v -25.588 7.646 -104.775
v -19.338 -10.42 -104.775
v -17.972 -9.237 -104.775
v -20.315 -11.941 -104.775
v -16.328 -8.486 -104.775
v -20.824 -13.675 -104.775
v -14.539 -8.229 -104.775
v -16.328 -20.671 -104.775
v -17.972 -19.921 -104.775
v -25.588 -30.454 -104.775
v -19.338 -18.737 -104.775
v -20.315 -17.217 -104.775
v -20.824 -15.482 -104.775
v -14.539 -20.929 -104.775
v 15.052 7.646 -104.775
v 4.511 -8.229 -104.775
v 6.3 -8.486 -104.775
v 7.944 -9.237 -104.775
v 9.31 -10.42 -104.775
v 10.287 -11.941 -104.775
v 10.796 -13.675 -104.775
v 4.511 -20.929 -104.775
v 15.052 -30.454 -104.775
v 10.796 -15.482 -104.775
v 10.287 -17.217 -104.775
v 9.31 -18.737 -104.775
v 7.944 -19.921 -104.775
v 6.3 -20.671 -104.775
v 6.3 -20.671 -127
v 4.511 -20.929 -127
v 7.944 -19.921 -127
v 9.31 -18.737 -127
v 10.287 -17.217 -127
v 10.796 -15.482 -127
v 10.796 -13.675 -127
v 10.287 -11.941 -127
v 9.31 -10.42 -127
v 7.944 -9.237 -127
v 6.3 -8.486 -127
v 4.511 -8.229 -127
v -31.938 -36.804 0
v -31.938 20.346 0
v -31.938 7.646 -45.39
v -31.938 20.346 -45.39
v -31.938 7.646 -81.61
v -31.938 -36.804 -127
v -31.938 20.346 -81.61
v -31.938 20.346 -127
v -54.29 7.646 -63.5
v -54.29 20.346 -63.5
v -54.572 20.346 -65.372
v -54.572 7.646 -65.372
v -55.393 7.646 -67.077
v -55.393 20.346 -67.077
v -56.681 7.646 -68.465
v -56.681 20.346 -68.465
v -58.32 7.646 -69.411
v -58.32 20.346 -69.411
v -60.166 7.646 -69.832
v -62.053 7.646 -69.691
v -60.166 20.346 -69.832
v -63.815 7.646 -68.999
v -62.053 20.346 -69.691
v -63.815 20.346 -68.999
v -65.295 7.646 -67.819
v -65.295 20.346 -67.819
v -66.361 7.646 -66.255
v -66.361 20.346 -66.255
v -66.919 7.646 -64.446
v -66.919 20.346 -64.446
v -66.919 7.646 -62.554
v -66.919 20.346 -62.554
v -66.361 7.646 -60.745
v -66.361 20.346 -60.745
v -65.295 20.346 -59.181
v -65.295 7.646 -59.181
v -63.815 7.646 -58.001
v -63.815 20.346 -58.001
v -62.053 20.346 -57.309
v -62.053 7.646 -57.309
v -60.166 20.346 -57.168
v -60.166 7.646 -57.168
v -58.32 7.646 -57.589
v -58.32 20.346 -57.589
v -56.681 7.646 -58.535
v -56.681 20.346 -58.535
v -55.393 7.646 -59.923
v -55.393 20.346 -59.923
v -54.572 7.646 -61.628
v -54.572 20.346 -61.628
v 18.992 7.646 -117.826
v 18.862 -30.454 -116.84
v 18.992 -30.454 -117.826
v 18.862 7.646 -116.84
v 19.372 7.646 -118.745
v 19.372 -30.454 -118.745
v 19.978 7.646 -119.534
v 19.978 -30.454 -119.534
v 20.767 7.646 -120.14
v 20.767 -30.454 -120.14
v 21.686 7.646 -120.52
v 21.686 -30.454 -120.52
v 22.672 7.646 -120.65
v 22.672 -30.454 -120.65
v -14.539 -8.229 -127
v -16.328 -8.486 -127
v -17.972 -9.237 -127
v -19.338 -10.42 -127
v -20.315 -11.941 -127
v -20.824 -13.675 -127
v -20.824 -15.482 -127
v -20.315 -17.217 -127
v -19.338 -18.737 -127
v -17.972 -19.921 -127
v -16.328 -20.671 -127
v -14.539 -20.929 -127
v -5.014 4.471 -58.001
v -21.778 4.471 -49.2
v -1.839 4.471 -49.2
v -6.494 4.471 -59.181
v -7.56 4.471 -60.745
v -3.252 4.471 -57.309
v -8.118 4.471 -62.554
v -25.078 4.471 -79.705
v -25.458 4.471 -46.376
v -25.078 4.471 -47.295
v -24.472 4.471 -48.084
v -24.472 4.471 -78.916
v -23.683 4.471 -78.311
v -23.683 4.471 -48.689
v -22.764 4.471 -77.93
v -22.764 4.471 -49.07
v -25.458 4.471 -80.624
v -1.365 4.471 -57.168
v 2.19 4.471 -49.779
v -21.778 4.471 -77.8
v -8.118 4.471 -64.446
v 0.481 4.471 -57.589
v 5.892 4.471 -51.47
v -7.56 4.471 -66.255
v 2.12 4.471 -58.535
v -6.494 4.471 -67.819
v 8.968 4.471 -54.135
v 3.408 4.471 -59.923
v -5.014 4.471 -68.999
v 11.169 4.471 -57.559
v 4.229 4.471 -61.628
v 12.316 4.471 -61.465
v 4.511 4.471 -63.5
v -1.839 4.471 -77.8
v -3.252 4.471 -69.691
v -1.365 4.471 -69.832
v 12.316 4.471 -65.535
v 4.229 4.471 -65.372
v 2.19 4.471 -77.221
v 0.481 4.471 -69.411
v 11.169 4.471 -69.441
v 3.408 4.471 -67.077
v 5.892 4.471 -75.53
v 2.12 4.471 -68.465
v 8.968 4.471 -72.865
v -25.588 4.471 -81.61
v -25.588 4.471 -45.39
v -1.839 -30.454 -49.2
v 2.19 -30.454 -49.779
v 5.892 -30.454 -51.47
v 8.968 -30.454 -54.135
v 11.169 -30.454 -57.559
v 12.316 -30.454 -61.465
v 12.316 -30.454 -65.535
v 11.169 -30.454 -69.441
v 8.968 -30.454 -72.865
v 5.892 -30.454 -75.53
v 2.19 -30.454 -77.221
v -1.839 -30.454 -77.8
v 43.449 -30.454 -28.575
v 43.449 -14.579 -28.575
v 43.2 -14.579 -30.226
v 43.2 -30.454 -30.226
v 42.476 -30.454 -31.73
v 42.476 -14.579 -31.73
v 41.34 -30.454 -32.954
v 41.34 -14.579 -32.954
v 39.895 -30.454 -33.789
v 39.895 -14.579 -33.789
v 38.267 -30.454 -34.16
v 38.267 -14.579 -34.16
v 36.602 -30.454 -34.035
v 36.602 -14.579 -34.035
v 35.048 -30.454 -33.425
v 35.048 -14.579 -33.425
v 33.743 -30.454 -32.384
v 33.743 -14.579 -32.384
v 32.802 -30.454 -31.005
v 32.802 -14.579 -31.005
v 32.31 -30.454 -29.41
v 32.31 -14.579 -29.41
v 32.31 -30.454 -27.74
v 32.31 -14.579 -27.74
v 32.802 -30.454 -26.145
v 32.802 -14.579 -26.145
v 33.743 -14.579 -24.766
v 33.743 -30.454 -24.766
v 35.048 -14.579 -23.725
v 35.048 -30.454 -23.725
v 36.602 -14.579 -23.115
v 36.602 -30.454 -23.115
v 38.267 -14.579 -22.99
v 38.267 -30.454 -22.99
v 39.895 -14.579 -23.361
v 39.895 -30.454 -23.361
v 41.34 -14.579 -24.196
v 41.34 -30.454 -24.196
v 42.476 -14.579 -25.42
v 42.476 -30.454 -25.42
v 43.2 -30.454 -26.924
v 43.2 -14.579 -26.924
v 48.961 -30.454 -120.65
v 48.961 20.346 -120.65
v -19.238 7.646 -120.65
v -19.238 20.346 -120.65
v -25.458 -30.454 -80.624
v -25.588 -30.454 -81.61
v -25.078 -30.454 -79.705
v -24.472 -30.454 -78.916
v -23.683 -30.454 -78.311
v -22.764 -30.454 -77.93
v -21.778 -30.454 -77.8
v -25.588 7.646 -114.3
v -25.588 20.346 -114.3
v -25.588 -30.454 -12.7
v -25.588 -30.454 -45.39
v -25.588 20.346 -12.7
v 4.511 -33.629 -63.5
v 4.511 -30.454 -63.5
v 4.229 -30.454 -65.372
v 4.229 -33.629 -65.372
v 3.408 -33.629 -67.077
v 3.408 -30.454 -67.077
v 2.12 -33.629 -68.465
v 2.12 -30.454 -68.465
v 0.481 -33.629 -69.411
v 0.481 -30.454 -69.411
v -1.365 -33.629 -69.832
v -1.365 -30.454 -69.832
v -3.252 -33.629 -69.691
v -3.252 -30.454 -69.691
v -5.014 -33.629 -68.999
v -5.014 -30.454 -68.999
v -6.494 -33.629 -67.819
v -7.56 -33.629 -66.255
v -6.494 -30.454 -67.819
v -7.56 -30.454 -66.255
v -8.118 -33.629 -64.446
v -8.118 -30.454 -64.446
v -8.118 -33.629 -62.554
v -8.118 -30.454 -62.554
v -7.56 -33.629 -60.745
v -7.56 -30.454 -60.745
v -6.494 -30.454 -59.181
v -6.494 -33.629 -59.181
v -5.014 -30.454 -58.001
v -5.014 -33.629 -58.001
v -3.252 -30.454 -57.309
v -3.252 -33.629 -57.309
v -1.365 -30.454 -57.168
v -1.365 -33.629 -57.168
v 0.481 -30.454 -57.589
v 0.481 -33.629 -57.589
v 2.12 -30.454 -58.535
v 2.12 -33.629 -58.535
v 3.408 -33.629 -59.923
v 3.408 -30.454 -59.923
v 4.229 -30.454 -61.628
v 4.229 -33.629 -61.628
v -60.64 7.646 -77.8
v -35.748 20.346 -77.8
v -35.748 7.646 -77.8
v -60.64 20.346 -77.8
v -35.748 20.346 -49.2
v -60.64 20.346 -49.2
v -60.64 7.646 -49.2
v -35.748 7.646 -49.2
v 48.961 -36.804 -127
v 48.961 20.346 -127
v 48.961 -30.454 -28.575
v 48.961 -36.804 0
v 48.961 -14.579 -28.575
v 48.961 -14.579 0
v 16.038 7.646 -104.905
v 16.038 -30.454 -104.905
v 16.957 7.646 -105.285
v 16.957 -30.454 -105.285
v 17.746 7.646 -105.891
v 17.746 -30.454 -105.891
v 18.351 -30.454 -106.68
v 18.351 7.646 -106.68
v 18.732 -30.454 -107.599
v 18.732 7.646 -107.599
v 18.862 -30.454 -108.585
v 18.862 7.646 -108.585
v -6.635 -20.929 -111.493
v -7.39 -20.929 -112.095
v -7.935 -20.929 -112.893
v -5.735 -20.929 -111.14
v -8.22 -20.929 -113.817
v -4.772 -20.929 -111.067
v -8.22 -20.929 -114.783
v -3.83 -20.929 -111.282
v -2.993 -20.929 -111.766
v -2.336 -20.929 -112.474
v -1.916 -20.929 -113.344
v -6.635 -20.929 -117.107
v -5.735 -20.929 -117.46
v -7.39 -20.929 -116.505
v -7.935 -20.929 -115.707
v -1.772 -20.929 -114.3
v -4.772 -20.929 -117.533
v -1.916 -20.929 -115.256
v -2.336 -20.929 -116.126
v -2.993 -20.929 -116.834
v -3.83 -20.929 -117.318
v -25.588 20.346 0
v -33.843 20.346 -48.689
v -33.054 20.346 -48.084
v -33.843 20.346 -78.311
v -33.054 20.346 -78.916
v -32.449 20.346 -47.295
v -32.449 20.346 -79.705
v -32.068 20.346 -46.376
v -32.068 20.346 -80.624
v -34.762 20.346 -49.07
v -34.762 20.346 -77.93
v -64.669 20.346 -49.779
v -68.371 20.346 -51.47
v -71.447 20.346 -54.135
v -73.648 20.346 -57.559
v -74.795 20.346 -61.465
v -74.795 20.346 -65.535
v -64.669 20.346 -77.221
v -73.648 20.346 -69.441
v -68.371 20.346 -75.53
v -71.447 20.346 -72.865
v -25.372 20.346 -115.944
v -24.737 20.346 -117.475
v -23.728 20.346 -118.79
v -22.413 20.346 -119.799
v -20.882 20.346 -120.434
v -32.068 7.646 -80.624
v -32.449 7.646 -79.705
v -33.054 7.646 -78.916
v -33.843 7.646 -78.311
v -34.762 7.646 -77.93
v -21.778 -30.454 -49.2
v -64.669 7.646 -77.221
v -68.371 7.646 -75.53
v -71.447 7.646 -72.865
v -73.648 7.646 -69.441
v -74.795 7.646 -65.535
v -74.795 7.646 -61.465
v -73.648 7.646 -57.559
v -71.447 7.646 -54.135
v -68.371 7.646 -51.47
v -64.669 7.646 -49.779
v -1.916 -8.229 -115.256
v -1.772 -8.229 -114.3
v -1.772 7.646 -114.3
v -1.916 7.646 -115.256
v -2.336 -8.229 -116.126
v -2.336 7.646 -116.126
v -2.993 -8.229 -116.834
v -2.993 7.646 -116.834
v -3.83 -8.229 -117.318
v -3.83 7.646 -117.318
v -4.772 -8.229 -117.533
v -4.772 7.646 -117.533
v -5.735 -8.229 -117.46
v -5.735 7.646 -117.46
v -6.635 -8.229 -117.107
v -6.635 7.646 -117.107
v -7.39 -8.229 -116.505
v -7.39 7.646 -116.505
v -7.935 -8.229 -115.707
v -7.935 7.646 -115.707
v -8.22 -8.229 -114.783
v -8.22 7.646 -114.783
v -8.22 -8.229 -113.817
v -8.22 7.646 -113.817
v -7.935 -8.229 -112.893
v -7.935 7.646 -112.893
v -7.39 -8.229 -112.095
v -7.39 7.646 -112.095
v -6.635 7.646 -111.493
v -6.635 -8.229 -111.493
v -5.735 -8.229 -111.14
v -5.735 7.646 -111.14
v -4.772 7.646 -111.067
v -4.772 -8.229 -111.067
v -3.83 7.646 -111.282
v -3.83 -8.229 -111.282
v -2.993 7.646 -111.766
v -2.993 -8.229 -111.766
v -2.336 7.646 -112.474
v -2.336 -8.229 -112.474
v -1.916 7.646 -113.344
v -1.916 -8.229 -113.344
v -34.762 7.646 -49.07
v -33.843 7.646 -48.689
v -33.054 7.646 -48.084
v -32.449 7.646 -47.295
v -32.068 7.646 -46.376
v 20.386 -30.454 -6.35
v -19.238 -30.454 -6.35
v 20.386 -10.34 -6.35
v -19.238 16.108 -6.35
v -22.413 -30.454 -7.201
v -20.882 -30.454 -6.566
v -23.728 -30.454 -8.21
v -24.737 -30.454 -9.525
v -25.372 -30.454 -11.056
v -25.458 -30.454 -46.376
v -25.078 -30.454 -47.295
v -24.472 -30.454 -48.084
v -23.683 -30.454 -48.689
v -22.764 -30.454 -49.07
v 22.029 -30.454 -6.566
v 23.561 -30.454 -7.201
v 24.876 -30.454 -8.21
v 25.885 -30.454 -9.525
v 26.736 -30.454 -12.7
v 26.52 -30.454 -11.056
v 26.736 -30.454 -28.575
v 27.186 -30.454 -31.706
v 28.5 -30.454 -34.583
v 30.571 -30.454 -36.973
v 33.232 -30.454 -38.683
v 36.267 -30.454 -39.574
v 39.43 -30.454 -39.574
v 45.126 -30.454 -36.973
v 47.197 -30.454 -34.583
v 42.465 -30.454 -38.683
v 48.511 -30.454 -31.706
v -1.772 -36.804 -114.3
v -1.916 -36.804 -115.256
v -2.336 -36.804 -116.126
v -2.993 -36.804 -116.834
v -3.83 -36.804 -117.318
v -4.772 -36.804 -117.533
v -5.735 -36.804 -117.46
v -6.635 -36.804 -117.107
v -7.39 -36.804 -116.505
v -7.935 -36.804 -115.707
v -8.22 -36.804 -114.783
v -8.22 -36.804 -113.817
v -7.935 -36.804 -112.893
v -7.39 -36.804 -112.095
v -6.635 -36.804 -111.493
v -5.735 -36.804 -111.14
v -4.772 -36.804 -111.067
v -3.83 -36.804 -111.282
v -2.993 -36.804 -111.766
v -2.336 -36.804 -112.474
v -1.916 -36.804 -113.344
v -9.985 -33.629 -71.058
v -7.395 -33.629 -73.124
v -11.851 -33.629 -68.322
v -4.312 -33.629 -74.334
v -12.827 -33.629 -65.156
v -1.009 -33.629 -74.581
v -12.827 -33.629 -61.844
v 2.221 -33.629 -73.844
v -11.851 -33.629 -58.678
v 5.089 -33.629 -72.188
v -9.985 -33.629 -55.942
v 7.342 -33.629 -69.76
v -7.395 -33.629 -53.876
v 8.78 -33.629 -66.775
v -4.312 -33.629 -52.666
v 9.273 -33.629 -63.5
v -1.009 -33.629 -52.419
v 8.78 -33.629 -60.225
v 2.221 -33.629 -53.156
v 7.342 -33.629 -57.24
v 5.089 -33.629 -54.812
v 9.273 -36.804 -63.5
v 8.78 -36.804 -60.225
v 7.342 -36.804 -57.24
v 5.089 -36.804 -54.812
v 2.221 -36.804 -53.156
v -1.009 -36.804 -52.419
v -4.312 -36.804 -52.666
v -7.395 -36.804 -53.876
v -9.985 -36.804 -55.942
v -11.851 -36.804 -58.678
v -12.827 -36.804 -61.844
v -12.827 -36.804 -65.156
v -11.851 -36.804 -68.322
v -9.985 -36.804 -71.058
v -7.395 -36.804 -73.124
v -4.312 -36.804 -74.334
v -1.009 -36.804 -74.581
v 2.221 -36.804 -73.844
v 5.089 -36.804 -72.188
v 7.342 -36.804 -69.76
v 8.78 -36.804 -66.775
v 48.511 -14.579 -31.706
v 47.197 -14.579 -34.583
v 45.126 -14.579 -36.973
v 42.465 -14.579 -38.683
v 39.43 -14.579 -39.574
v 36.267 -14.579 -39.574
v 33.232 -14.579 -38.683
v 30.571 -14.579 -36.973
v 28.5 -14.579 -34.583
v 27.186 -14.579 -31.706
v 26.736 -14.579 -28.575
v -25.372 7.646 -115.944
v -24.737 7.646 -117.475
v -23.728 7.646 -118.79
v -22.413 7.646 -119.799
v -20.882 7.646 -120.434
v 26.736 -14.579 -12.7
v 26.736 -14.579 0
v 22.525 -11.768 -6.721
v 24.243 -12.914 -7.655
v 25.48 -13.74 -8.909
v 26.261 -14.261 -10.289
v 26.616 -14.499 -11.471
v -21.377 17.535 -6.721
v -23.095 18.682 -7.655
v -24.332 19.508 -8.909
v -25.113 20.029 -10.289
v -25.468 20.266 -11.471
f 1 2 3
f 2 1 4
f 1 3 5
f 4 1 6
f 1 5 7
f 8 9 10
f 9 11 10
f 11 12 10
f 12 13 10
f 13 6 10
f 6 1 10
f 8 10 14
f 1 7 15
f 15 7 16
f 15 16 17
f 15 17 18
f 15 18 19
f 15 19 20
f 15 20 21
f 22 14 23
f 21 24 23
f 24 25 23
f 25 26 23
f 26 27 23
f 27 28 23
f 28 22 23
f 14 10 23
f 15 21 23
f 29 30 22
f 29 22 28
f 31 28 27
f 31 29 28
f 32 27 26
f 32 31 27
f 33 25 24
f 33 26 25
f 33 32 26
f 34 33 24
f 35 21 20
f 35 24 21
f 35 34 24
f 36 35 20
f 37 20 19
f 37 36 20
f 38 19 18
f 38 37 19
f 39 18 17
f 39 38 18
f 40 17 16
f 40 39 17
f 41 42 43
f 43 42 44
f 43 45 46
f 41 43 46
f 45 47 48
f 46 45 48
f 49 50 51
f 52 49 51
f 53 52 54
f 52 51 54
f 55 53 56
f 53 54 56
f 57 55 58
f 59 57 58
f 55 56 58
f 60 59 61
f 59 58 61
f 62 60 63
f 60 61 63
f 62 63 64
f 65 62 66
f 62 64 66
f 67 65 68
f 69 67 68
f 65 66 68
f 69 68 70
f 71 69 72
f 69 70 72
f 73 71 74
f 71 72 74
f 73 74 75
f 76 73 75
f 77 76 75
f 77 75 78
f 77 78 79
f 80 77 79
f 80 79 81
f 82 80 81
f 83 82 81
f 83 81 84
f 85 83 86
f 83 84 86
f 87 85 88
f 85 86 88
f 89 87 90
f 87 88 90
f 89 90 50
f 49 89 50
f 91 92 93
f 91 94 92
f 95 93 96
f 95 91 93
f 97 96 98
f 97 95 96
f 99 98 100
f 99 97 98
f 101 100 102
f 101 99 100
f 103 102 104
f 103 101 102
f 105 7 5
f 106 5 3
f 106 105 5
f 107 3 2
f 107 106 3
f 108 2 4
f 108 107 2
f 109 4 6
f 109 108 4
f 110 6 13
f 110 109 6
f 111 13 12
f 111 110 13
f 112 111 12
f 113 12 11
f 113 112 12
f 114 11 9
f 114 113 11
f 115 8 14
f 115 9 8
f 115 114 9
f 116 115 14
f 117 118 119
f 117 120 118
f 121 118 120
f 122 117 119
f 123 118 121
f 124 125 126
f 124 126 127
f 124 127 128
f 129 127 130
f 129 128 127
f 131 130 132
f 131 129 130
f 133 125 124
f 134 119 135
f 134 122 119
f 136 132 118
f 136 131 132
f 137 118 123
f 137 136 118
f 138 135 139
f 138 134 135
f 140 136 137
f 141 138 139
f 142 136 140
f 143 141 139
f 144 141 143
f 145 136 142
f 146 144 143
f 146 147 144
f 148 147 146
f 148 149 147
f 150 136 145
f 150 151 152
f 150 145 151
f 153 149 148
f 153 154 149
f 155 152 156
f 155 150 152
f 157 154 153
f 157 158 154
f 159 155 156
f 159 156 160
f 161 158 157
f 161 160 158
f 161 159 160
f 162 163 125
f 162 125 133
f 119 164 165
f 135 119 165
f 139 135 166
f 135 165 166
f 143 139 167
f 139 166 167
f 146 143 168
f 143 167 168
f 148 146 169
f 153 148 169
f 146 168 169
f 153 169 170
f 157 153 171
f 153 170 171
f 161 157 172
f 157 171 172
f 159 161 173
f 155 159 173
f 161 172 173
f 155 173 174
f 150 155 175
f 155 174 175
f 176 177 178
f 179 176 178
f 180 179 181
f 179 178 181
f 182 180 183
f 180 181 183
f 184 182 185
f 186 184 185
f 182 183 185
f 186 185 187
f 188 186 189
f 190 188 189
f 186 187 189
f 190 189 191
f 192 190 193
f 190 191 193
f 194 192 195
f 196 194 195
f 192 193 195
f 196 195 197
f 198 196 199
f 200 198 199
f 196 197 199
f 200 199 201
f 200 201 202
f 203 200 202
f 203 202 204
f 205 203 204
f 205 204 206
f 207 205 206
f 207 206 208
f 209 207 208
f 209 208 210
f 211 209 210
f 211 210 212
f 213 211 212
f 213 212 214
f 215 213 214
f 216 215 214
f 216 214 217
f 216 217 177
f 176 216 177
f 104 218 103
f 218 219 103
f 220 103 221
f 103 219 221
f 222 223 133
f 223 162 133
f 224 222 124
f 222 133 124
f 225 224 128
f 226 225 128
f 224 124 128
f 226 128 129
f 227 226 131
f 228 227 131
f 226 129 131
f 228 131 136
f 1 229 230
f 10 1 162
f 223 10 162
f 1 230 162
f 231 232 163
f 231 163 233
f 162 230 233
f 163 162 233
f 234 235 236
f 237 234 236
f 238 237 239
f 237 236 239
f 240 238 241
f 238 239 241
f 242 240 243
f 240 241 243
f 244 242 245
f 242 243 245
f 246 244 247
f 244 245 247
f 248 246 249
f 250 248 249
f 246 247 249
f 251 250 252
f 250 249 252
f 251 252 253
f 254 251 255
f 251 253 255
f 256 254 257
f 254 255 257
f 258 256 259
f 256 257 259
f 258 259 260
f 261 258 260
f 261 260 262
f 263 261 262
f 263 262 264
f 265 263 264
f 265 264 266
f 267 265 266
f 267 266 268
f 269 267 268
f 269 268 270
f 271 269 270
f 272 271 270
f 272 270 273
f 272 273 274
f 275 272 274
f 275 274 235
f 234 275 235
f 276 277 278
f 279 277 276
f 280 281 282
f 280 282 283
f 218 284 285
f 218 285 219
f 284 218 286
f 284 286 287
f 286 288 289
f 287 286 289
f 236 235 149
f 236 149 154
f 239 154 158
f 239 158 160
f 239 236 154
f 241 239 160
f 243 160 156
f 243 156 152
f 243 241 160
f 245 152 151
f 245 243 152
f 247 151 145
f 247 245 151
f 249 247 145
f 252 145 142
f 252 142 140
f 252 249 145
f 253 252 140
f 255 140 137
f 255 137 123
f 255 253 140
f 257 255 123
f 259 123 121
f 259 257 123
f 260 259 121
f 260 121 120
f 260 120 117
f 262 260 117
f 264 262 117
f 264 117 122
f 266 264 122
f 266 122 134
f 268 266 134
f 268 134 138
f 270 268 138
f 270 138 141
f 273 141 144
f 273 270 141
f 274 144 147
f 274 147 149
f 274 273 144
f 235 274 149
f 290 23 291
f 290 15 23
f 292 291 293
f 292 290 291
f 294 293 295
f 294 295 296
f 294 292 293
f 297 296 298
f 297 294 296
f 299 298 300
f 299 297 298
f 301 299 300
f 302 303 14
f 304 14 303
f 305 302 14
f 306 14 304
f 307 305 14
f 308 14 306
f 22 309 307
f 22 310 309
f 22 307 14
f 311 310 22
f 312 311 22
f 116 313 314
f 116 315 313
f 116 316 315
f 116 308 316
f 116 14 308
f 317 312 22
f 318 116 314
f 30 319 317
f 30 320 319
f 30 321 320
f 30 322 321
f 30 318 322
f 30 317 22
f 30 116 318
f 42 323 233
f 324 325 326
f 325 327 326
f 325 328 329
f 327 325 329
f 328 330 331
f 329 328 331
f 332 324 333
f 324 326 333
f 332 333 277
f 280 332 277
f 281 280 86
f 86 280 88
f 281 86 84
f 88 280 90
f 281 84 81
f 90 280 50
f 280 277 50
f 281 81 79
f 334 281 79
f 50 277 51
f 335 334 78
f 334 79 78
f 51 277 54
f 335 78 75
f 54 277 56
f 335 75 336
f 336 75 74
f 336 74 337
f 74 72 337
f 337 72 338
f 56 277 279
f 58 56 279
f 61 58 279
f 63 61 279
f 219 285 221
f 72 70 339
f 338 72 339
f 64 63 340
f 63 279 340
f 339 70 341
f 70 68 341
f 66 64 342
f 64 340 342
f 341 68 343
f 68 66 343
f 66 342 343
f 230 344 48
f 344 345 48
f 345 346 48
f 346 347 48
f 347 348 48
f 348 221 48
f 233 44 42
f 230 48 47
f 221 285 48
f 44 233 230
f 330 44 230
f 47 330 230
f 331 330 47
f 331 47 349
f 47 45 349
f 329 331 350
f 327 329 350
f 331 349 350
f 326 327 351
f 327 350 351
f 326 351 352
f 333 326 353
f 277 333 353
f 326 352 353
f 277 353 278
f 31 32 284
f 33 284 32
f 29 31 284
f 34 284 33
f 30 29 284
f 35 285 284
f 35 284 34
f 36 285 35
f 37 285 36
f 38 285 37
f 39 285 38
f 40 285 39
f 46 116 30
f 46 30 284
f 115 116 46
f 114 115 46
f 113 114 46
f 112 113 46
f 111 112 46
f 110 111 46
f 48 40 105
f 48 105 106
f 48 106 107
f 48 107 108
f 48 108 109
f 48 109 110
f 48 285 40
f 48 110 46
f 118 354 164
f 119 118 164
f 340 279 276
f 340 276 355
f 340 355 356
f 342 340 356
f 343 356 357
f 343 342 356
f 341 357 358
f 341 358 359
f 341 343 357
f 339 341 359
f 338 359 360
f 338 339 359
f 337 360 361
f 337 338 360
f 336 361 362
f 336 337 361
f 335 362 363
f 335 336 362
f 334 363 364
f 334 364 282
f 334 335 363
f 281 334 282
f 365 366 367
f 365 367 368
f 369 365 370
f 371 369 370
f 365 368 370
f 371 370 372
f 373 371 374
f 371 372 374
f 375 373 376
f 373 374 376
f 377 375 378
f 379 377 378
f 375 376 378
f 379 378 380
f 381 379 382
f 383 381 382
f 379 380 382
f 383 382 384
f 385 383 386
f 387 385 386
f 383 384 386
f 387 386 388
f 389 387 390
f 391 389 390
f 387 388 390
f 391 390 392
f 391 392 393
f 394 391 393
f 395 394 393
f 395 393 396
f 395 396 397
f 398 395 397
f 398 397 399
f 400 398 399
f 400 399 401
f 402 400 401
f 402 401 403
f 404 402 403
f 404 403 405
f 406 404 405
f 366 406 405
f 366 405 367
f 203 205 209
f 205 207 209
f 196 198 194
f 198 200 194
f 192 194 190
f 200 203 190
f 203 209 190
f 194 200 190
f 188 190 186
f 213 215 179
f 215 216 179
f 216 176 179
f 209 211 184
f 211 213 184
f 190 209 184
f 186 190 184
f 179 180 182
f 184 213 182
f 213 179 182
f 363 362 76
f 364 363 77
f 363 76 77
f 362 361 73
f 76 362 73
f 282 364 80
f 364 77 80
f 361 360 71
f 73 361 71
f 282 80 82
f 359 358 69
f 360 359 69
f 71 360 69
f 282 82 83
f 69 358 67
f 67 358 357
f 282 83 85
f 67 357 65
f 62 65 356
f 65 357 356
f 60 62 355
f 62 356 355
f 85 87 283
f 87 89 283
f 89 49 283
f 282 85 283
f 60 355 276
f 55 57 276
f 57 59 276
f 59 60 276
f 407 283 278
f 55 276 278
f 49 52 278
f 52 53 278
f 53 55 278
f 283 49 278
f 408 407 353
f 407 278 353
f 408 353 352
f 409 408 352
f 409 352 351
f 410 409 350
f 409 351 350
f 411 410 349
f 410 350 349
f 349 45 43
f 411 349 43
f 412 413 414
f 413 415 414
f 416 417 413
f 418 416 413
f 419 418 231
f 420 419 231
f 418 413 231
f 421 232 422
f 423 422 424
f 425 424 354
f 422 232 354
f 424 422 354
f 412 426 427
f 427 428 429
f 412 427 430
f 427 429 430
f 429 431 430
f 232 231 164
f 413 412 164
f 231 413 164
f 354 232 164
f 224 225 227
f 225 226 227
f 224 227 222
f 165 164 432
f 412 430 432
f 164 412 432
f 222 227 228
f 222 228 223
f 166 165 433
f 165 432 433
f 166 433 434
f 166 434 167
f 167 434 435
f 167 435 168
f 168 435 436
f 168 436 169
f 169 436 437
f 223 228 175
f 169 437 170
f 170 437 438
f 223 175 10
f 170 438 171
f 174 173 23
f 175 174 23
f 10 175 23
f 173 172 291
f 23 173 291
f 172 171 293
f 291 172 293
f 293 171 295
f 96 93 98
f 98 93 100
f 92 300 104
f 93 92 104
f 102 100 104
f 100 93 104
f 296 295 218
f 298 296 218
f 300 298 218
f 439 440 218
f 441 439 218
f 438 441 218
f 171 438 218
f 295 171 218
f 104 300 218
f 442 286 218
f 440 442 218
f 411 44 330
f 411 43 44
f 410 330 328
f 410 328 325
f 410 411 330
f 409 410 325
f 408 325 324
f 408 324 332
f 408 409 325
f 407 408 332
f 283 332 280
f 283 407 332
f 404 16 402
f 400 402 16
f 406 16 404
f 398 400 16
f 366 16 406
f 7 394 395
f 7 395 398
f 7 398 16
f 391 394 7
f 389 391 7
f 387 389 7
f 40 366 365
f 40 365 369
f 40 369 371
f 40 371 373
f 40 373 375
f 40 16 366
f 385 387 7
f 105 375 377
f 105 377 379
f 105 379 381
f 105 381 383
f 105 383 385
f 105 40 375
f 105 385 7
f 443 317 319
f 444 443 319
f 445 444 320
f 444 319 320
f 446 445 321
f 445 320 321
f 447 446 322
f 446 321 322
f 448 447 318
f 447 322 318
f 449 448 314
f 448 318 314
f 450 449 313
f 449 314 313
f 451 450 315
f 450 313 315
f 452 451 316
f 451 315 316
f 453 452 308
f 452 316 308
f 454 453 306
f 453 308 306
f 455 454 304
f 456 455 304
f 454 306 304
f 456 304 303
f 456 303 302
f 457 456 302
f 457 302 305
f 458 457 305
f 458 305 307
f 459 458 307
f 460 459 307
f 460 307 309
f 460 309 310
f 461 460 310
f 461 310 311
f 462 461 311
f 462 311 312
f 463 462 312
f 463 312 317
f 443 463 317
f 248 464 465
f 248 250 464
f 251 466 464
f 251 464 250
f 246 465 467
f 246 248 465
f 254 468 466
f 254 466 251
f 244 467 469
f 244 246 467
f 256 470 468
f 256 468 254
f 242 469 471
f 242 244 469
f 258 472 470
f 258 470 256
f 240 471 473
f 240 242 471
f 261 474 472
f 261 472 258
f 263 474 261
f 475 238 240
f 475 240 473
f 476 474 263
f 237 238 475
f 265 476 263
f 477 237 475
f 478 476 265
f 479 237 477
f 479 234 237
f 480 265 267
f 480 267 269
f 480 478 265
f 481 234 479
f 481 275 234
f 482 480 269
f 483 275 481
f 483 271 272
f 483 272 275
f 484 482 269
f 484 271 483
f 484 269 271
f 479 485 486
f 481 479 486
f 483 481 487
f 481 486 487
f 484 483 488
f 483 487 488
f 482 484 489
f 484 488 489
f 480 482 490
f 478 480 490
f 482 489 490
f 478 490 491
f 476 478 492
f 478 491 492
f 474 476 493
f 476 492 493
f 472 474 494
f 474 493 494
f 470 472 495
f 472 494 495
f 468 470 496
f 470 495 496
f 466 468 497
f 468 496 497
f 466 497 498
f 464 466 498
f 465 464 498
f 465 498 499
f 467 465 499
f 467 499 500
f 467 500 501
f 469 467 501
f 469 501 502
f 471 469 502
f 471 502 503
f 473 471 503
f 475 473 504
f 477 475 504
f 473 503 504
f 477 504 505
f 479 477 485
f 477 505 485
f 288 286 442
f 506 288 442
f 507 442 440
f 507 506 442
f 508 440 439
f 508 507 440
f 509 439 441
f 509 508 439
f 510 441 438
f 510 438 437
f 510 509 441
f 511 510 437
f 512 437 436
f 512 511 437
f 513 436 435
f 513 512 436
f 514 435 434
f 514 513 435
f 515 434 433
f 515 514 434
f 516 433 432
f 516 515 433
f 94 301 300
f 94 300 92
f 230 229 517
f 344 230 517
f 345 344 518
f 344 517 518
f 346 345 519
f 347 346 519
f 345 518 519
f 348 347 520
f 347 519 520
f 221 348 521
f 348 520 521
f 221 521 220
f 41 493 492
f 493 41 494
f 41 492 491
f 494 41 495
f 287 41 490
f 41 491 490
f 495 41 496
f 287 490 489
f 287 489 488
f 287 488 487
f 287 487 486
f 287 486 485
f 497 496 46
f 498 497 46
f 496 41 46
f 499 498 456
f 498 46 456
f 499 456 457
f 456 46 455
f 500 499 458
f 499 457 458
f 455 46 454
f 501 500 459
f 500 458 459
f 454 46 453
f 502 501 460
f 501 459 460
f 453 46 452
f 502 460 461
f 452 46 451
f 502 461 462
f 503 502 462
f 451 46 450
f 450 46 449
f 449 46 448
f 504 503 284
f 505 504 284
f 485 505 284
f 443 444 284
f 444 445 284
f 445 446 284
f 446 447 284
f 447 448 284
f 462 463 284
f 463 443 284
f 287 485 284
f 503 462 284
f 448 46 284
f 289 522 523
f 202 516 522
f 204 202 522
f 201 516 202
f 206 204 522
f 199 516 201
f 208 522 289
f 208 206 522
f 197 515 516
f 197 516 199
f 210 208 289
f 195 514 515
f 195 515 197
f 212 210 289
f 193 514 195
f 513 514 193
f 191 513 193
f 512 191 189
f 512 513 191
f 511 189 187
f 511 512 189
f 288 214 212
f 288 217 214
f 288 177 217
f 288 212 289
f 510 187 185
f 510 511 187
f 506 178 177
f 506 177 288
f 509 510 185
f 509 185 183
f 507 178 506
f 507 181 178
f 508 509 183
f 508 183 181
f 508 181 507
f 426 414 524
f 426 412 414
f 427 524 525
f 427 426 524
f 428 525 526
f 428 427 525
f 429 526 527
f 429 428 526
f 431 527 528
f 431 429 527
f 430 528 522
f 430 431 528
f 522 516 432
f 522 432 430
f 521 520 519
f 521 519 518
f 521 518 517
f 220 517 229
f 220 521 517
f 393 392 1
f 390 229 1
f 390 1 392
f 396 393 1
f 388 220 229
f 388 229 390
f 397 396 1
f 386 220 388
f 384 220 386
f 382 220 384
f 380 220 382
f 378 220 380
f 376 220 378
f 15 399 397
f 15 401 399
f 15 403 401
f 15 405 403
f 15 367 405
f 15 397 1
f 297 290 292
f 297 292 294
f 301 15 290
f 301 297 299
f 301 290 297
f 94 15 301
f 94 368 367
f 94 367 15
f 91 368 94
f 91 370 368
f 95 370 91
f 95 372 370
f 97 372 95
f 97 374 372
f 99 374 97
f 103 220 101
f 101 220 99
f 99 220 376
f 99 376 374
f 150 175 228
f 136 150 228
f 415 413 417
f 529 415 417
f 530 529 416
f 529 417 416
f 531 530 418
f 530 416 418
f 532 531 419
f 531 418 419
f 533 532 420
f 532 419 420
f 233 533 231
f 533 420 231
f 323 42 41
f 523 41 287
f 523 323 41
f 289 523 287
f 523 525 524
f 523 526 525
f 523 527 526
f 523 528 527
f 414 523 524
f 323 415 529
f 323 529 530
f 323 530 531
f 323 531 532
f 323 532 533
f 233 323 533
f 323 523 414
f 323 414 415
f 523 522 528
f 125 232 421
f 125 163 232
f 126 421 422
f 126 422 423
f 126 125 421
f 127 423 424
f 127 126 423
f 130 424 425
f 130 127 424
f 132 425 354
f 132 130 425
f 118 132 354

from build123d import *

# Parameters (mm, degrees)
BOSS_EXTRUDE1_DEPTH = 6.35
BOSS_EXTRUDE2_DEPTH = 57.15
FILLET1_R           = 6.35
SKETCH3_R           = 5.6007
BOSS_EXTRUDE3_DEPTH = 22.225
SKETCH4_W           = 127
SKETCH4_H           = 6.35
BOSS_EXTRUDE4_DEPTH = 80.899
BOSS_EXTRUDE5_DEPTH = 38.1
FILLET2_R           = 3.81
SKETCH6_R           = 6.35
BOSS_EXTRUDE6_DEPTH = 34.925
SKETCH7_R           = 6.35
CUT_EXTRUDE1_DEPTH  = 34.925
SKETCH8_R           = 11.1125
CUT_EXTRUDE2_DEPTH  = 3.175
FILLET3_R           = 6.35
SKETCH10_R          = 6.35
BOSS_EXTRUDE7_DEPTH = 12.7
FILLET4_R           = 3.81
CUT_EXTRUDE3_REACH  = 46.45
SKETCH11_R          = 3.241727166
CUT_EXTRUDE4_REACH  = 129


with BuildPart() as part:
    # Sketch1 → Boss-Extrude1 (new body)
    with BuildSketch(Plane.XY):
        Polygon((-25.588082164, 20.346341683), (-31.938082164, 20.346341683), (-31.938082164, -36.803658317), (48.960917836, -36.803658317), (48.960917836, -14.578658317), (26.735917836, -14.578658317), align=None)
    extrude(amount=-BOSS_EXTRUDE1_DEPTH)

    # Sketch2 → Boss-Extrude2 (add)
    with BuildSketch(Plane(origin=(0, 20.346341683, 0), x_dir=(1, 0, 0), z_dir=(0, 1, 0))):
        Polygon((48.960917836, 127), (48.960917836, 120.65), (-25.588082164, 120.65), (-25.588082164, 6.35), (-31.938082164, 6.35), (-31.938082164, 127), (-25.588082164, 127), align=None)
    extrude(amount=-BOSS_EXTRUDE2_DEPTH)

    # Fillet1
    fillet1_edges = [part.edges().sort_by_distance(p)[0] for p in [
        (-25.588082164, -8.228658317, -120.65),
        (-25.588082164, -8.228658317, -6.35),
    ]]
    fillet(fillet1_edges, radius=FILLET1_R)

    # Sketch3 → Boss-Extrude3 (add)
    with BuildSketch(Plane(origin=(0, -14.578658317, 0), x_dir=(1, 0, 0), z_dir=(0, 1, 0))):
        with BuildLine():
            Line((26.735917836, 6.35), (48.960917836, 6.35))
            Line((48.960917836, 6.35), (48.960917836, 28.575))
            ThreePointArc((48.960917836, 28.575), (37.848417836, 39.6875), (26.735917836, 28.575))
            Line((26.735917836, 28.575), (26.735917836, 6.35))
        make_face()
        with Locations((37.848417836, 28.575)):
            Circle(SKETCH3_R, mode=Mode.SUBTRACT)
    extrude(amount=-BOSS_EXTRUDE3_DEPTH)

    # Sketch4 → Boss-Extrude4 (add)
    with BuildSketch(Plane(origin=(48.960917836, 0, 0), x_dir=(0, 0, -1), z_dir=(1, 0, 0))):
        with Locations((63.5, -33.628658317)):
            Rectangle(SKETCH4_W, SKETCH4_H)
    extrude(amount=-BOSS_EXTRUDE4_DEPTH)

    # Sketch5 → Boss-Extrude5 (add)
    with BuildSketch(Plane(origin=(0, -30.453658317, 0), x_dir=(1, 0, 0), z_dir=(0, 1, 0))):
        with BuildLine():
            Line((-25.588082164, 104.775), (18.861917836, 104.775))
            Line((18.861917836, 104.775), (18.861917836, 120.65))
            Line((18.861917836, 120.65), (-19.238082164, 120.65))
            ThreePointArc((-19.238082164, 120.65), (-23.728210225, 118.790128061), (-25.588082164, 114.3))
            Line((-25.588082164, 114.3), (-25.588082164, 104.775))
        make_face()
    extrude(amount=BOSS_EXTRUDE5_DEPTH)

    # Fillet2
    fillet2_edges = [part.edges().sort_by_distance(p)[0] for p in [
        (18.861917836, -11.403658317, -104.775),
        (18.861917836, -11.403658317, -120.65),
    ]]
    fillet(fillet2_edges, radius=FILLET2_R)

    # Sketch6 → Boss-Extrude6 (add)
    with BuildSketch(Plane(origin=(0, -30.453658317, 0), x_dir=(1, 0, 0), z_dir=(0, 1, 0))):
        with BuildLine():
            Line((-1.839082164, 77.8002), (-25.588082164, 77.8002))
            Line((-25.588082164, 77.8002), (-25.588082164, 49.1998))
            Line((-25.588082164, 49.1998), (-1.839082164, 49.1998))
            ThreePointArc((-1.839082164, 49.1998), (12.461117836, 63.5), (-1.839082164, 77.8002))
        make_face()
        with Locations((-1.839082164, 63.5)):
            Circle(SKETCH6_R, mode=Mode.SUBTRACT)
    extrude(amount=BOSS_EXTRUDE6_DEPTH)

    # Sketch7 → Cut-Extrude1 (cut)
    with BuildSketch(Plane(origin=(0, -30.453658317, 0), x_dir=(1, 0, 0), z_dir=(0, 1, 0))):
        with Locations((-1.839082164, 63.5)):
            Circle(SKETCH7_R)
    extrude(amount=-CUT_EXTRUDE1_DEPTH, mode=Mode.SUBTRACT)

    # Sketch8 → Cut-Extrude2 (cut)
    with BuildSketch(Plane.XZ.offset(36.803658317)):
        with Locations((-1.839082164, -63.5)):
            Circle(SKETCH8_R)
    extrude(amount=-CUT_EXTRUDE2_DEPTH, mode=Mode.SUBTRACT)

    # Fillet3
    fillet3_edges = [part.edges().sort_by_distance(p)[0] for p in [
        (26.735917836, -22.516158317, -6.35),
    ]]
    fillet(fillet3_edges, radius=FILLET3_R)

    # Sketch10 → Boss-Extrude7 (add)
    with BuildSketch(Plane(origin=(0, 20.346341683, 0), x_dir=(1, 0, 0), z_dir=(0, 1, 0))):
        with BuildLine():
            Line((-60.640082164, 49.1998), (-31.938082164, 49.1998))
            Line((-31.938082164, 49.1998), (-31.938082164, 77.8002))
            Line((-31.938082164, 77.8002), (-60.640082164, 77.8002))
            ThreePointArc((-60.640082164, 77.8002), (-74.940282164, 63.5), (-60.640082164, 49.1998))
        make_face()
        with Locations((-60.640082164, 63.5)):
            Circle(SKETCH10_R, mode=Mode.SUBTRACT)
    extrude(amount=-BOSS_EXTRUDE7_DEPTH)

    # Fillet4
    fillet4_edges = [part.edges().sort_by_distance(p)[0] for p in [
        (-25.588082164, -12.991158317, -77.8002),
        (-25.588082164, -12.991158317, -49.1998),
        (-31.938082164, 13.996341683, -77.8002),
        (-31.938082164, 13.996341683, -49.1998),
    ]]
    fillet(fillet4_edges, radius=FILLET4_R)

    # Sketch11 → Cut-Extrude3 (cut, up to next)
    with BuildSketch(Plane(origin=(0, 7.646341683, 0), x_dir=(1, 0, 0), z_dir=(0, 1, 0)), mode=Mode.PRIVATE) as cut_extrude3_sk1:
        with Locations((-5.014082164, 114.3)):
            Circle(SKETCH11_R)
    cut_extrude3_tool1 = extrude(cut_extrude3_sk1.sketch, amount=-CUT_EXTRUDE3_REACH, mode=Mode.PRIVATE) & part.part
    add(cut_extrude3_tool1.solids().sort_by_distance((-5.014082, 7.646342, -114.3))[0], mode=Mode.SUBTRACT)

    # Sketch12 → Cut-Extrude4 (cut, up to next)
    with BuildSketch(Plane(origin=(0, 0, -127), x_dir=(-1, 0, 0), z_dir=(0, 0, -1)), mode=Mode.PRIVATE) as cut_extrude4_sk1:
        with BuildLine():
            Line((-4.510928423, -8.228658317), (14.539060991, -8.228658317))
            ThreePointArc((14.539060991, -8.228658317), (20.889071577, -14.578653023), (14.539071577, -20.928658317))
            Line((14.539071577, -20.928658317), (-4.510907248, -20.928658317))
            ThreePointArc((-4.510907248, -20.928658317), (-10.860928423, -14.578668904), (-4.510928423, -8.228658317))
        make_face()
    cut_extrude4_tool1 = extrude(cut_extrude4_sk1.sketch, amount=-CUT_EXTRUDE4_REACH, mode=Mode.PRIVATE) & part.part
    add(cut_extrude4_tool1.solids().sort_by_distance((-5.014072, -14.578658, -127))[0], mode=Mode.SUBTRACT)


solid = part.part
